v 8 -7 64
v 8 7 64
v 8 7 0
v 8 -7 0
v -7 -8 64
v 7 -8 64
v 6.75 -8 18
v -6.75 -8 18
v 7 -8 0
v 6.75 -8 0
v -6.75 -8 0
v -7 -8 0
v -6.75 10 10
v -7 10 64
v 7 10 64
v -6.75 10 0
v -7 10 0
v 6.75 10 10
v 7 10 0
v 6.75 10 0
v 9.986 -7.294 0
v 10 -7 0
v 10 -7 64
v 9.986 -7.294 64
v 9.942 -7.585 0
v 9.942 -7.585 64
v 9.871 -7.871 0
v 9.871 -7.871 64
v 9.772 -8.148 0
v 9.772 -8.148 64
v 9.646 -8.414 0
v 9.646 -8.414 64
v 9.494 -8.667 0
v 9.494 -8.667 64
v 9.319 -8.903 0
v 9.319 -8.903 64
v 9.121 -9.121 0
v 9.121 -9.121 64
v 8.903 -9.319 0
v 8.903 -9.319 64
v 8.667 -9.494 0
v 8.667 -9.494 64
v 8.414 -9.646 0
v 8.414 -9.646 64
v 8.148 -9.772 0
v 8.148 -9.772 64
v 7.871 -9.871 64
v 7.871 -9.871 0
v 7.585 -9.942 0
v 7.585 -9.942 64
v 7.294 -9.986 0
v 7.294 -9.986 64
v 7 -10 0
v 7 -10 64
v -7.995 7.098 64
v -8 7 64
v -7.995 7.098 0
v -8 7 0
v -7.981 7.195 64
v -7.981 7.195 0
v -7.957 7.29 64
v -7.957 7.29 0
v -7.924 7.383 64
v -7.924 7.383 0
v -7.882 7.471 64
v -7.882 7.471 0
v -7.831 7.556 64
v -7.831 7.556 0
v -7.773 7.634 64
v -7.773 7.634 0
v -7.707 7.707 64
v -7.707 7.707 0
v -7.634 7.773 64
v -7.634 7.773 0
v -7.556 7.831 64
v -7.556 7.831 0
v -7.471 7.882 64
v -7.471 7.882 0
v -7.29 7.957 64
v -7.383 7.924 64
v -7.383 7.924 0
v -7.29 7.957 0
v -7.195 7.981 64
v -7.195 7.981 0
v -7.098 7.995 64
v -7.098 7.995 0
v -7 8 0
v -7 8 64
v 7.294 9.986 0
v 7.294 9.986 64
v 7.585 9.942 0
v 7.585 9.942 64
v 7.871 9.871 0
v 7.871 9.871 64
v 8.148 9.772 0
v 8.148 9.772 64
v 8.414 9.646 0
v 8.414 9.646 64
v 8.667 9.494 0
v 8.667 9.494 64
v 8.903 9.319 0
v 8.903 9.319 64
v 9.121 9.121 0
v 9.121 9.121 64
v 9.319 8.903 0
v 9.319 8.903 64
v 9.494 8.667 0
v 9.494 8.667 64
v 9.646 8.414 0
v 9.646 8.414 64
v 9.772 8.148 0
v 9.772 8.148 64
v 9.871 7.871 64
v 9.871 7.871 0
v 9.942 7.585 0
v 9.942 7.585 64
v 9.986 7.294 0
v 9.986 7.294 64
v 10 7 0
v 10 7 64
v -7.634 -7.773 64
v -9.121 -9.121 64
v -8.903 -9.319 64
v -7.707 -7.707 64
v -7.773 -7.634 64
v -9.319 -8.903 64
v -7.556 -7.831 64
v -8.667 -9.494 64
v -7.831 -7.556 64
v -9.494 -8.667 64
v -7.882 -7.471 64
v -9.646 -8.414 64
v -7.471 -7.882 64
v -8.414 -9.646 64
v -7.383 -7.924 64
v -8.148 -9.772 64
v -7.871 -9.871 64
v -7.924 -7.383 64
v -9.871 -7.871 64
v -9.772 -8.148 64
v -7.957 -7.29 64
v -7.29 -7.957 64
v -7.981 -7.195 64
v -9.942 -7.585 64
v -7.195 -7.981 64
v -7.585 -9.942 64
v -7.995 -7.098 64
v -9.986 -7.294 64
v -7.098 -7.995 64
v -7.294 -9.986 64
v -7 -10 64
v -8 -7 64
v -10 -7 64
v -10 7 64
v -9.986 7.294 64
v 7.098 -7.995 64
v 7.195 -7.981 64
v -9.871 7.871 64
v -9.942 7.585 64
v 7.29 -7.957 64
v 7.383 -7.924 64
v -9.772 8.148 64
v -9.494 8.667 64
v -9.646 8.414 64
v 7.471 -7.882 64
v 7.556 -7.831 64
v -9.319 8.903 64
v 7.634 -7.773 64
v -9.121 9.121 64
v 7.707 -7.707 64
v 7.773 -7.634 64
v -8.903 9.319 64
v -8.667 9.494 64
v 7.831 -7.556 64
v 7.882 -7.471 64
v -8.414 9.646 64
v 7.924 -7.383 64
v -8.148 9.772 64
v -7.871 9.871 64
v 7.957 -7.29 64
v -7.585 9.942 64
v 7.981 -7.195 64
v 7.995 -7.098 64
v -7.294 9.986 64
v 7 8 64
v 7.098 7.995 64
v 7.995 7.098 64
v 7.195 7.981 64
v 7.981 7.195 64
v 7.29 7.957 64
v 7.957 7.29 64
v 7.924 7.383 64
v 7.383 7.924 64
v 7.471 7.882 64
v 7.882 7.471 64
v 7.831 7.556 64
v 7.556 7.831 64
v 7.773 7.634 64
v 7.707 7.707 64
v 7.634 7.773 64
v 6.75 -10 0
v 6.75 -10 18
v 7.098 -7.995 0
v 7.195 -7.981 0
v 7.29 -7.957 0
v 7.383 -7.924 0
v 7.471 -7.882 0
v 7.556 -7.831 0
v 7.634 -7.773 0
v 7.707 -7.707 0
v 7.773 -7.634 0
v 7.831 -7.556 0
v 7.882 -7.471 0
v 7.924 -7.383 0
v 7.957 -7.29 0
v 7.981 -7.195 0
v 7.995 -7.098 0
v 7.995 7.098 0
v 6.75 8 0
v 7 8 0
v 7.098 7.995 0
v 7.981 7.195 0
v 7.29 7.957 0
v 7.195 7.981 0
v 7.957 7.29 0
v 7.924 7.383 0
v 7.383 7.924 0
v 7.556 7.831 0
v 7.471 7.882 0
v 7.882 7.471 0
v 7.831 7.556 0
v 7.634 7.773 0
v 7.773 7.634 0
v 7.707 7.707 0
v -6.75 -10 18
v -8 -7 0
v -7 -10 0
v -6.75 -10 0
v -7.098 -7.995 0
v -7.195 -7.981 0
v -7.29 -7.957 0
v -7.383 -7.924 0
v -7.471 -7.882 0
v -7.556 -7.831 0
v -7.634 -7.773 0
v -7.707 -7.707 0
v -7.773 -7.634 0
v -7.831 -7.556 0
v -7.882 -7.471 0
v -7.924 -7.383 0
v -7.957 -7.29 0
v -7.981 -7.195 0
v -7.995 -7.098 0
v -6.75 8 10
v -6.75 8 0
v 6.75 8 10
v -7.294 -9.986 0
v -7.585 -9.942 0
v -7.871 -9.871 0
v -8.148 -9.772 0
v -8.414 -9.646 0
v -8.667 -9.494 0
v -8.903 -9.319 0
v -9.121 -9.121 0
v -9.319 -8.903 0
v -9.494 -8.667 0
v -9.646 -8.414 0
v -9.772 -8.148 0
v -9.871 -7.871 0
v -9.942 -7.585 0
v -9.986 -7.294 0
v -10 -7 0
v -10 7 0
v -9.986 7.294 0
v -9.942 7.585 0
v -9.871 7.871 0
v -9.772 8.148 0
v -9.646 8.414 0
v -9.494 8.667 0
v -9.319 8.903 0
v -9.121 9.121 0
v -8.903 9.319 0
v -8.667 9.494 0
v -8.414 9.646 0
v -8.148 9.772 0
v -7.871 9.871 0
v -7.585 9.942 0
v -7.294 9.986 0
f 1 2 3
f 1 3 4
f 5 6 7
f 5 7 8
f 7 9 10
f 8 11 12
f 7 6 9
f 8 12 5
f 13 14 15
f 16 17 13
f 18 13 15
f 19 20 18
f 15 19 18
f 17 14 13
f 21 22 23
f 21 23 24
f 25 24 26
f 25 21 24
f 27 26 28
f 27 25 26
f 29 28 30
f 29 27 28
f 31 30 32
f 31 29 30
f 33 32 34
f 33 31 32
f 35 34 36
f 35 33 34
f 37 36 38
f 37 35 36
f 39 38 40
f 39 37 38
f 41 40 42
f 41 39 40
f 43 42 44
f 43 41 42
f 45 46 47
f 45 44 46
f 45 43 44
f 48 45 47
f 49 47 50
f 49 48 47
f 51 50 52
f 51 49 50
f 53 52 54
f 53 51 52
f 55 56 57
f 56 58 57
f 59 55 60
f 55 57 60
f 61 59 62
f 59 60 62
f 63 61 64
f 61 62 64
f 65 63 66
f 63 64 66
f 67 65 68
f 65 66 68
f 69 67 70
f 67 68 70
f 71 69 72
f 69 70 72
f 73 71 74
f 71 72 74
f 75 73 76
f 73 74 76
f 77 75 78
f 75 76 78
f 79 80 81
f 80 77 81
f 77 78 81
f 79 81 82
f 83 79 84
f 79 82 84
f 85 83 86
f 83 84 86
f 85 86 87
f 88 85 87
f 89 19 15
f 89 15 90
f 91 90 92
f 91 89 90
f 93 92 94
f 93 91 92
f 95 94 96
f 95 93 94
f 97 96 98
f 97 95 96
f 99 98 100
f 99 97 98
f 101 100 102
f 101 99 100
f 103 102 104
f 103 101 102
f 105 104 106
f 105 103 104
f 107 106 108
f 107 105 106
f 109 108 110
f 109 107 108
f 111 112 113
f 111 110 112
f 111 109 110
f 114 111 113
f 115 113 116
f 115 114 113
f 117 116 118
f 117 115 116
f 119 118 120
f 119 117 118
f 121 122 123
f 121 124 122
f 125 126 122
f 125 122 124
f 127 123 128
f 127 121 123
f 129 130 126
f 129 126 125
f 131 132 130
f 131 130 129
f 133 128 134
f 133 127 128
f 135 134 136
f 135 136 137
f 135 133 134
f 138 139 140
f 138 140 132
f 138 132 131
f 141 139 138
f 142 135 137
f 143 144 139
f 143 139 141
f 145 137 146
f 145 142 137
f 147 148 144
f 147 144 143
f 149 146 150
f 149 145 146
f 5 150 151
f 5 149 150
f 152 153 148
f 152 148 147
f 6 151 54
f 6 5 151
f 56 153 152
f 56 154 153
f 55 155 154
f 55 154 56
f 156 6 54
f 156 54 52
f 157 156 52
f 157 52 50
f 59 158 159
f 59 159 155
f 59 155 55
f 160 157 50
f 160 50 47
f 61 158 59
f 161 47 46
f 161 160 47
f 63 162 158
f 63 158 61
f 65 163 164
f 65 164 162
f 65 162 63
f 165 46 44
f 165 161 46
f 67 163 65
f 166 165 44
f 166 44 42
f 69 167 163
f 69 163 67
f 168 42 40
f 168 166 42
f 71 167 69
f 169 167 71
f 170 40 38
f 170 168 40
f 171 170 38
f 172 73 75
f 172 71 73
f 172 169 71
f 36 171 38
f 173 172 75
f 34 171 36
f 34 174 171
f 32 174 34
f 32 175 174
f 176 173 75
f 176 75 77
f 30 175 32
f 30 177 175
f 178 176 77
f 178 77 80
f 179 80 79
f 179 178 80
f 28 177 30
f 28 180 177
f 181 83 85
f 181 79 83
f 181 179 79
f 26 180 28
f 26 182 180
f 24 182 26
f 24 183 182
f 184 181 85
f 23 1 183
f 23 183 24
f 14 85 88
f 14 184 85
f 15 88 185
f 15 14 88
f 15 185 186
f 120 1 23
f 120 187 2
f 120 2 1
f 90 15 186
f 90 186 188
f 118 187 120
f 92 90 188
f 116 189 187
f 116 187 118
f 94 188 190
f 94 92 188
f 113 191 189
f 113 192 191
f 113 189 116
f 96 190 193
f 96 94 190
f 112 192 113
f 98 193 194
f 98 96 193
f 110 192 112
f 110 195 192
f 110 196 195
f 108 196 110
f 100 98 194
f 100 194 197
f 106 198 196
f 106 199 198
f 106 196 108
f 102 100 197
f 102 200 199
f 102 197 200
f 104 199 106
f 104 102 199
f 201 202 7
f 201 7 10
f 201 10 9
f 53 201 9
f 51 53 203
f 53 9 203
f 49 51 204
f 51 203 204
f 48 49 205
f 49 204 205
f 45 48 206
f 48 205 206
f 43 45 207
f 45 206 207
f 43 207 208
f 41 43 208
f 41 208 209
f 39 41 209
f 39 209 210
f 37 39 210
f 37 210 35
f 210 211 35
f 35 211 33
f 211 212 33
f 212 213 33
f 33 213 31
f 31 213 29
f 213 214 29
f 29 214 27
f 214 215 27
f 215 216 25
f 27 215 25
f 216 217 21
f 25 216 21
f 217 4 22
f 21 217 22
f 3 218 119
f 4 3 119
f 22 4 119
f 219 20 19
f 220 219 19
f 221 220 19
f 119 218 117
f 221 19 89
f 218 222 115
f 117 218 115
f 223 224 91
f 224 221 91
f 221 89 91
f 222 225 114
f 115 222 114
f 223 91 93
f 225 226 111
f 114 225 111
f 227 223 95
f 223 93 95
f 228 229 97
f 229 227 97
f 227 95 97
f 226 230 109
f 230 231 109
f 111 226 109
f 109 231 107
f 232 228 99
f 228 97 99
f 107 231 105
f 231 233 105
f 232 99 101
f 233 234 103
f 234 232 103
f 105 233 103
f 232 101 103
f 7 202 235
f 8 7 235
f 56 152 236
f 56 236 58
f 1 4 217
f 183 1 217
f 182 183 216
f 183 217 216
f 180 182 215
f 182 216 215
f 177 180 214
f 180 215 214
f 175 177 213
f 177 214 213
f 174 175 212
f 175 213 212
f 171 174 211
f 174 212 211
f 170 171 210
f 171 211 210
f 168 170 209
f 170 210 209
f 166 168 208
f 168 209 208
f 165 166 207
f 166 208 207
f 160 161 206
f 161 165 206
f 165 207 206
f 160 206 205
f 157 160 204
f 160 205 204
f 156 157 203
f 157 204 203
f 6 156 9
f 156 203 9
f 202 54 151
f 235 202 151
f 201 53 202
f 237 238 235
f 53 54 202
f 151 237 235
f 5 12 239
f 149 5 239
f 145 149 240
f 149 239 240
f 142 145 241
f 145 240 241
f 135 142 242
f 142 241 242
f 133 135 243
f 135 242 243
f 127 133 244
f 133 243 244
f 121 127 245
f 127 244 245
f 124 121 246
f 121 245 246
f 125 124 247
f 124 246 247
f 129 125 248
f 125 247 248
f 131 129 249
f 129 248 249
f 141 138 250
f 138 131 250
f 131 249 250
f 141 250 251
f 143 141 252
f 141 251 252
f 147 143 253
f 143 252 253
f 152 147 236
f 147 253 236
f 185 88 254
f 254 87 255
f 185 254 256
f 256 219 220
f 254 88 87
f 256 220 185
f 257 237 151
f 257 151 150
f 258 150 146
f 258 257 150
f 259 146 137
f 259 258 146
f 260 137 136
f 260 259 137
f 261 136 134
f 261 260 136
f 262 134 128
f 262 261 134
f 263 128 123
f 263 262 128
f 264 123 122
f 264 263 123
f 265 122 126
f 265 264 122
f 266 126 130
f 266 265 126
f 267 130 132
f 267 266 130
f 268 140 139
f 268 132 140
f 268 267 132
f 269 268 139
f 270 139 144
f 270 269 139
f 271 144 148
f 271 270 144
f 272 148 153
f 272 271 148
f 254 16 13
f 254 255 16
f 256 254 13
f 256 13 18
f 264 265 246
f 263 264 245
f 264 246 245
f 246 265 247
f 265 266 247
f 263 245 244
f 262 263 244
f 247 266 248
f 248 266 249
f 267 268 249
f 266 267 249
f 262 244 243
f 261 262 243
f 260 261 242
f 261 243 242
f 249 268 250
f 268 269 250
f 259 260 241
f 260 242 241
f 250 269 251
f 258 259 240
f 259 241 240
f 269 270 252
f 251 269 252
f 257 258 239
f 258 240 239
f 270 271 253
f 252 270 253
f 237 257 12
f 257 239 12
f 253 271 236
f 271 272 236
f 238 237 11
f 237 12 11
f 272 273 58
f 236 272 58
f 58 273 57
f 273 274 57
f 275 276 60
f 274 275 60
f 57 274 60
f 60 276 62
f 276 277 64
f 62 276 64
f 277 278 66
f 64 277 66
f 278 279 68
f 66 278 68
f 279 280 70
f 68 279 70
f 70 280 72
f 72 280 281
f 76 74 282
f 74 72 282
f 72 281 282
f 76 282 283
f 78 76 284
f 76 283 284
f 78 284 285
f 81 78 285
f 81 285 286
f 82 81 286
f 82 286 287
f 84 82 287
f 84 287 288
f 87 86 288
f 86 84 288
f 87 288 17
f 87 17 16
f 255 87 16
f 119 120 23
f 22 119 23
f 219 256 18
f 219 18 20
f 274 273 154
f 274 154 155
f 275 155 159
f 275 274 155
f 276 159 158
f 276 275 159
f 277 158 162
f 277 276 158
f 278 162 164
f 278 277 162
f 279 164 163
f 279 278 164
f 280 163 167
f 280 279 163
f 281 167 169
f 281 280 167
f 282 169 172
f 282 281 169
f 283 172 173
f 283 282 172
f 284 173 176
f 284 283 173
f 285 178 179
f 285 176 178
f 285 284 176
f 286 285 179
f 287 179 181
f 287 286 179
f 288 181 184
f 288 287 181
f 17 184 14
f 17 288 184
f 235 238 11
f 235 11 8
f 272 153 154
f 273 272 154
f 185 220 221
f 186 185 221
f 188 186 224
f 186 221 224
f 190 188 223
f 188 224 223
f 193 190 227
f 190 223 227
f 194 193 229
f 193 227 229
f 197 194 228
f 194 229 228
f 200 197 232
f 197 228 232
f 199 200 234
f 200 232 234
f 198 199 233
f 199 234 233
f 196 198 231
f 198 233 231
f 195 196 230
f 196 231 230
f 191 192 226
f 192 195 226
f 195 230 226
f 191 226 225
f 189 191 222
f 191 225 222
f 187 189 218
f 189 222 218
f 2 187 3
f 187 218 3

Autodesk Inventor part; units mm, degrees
ref_plane "YZ Plane" through (0, 0, 0) normal (1, 0, 0) x (0, 1, 0)
ref_plane "Start Plane" through (0, 0, 0) normal (0, 0, 1) x (1, 0, 0)
ref_plane "End Plane" through (0, 0, 64) normal (0, 0, 1) x (1, 0, 0)
sketch "Sketch" plane through (0, 0, 0) normal (0, 0, 1) x (1, 0, 0)
  line L0 (-10, -7) -> (-10, 7)
  line L1 (-7, 10) -> (7, 10)
  line L2 (10, 7) -> (10, -7)
  line L3 (7, -10) -> (-7, -10)
  arc A0 (-10, -7) -> (-7, -10) centre (-7, -7) ccw
  arc A1 (-7, 10) -> (-10, 7) centre (-7, 7) ccw
  arc A2 (10, 7) -> (7, 10) centre (7, 7) ccw
  arc A3 (7, -10) -> (10, -7) centre (7, -7) ccw
  arc A4 (-7, 8) -> (-8, 7) centre (-7, 7) ccw
  line L4 (-7, 8) -> (7, 8)
  arc A5 (8, 7) -> (7, 8) centre (7, 7) ccw
  line L5 (8, 7) -> (8, -7)
  arc A6 (7, -8) -> (8, -7) centre (7, -7) ccw
  line L6 (7, -8) -> (-7, -8)
  arc A7 (-8, -7) -> (-7, -8) centre (-7, -7) ccw
  line L7 (-8, -7) -> (-8, 7)
  line L8 (0, 14.8698) -> (0, -14.8698) construction
  line L9 (-14.8698, 0) -> (14.8698, 0) construction
  dimension "d7" = 3
  dimension "d10" = 20
  dimension "d11" = 20
  dimension "d12" = 2
  dimension "d15" = 10
  dimension "d16" = 10
extrude "Body" add sketch "Sketch" along normal up to surface (64 mm away) from surface at 0
sketch "Sketch3" plane through (0, 0, 0) normal (0, 0, 1) x (1, 0, 0)
  line L0 (0, 0) -> (10, 0)
ref_plane "Work Plane3" through (0, 0, 0) normal (0, -1, 0) x (1, 0, 0)
sketch "Sketch4" plane through (0, 0, 0) normal (0, -1, 0) x (1, 0, 0)
  line L0 (-2, 0) -> (12, 0)
  line L1 (-2, 64) -> (12, 64)
  dimension "d18" = 64
sketch "Sketch5" plane through (-7, -10, 0) normal (0, -1, 0) x (1, 0, 0)
  line L0 (14, 64) -> (0, 64)
  line L1 (0, 0) -> (0, 64)
  line L2 (14, 0) -> (0, 0)
  line L3 (14, 18) -> (0, 18)
  line L4 (14, 18) -> (14, 0)
  line L5 (0, 0) -> (0, 64) projected
  line L6 (0, 0) -> (0, 18)
  line L7 (14, 0) -> (0, 0) projected
  line L8 (7, 18) -> (7, 15) construction
  line L9 (13.75, 0) -> (0.25, 0)
  line L10 (0.25, 0) -> (0.25, 10)
  line L11 (0.25, 10) -> (13.75, 10)
  line L12 (13.75, 10) -> (13.75, 0)
  line L13 (14, 0) -> (14, 64) projected
  line L14 (14, 10) -> (0, 10)
  line L15 (0, 10) -> (0, 18)
  line L16 (0, 18) -> (14, 18)
  line L17 (14, 18) -> (14, 10)
  line L18 (13.75, 10) -> (13.75, 18)
  line L19 (0.25, 10) -> (0.25, 18)
  point P0 (7, 0)
  point P1 (7, 0)
  point P2 (0.25, 0)
  point P3 (13.75, 0)
  point P4 (0.25, 18)
  dimension "d19" = 18
  dimension "d23" = 13.5
  dimension "d24" = 10
  dimension "d27" = 8
extrude "Extrusion3" cut sketch "Sketch5" against normal through all contours L12 L2 L10 L11
extrude "Extrusion4" cut sketch "Sketch5" against normal up to next contours L18 L11 L19 L3
equation "\"d7\" = G_IR"
equation "\"d10\" = G_H"
equation "\"d11\" = G_W"
equation "\"d12\" = G_T"
equation "\"d15\" = 0.5 * d10"
equation "\"d16\" = 0.5 * d11"
equation "\"d3\" = G_L"
equation "\"G_W\" = 20"
equation "\"G_H\" = 20"
equation "\"G_T\" = 2"
equation "\"G_IR\" = 3"
equation "\"G_L\" = d18"
equation "\"G_OFFSET_START\" = 0"
equation "\"G_OFFSET_END\" = 0"
equation "\"d14\" = G_OFFSET_END + B_L"
equation "\"B_L\" = 64"
properties part number "ISO 12633-2 - 20x20x2 - 64" material "Steel, Mild"
